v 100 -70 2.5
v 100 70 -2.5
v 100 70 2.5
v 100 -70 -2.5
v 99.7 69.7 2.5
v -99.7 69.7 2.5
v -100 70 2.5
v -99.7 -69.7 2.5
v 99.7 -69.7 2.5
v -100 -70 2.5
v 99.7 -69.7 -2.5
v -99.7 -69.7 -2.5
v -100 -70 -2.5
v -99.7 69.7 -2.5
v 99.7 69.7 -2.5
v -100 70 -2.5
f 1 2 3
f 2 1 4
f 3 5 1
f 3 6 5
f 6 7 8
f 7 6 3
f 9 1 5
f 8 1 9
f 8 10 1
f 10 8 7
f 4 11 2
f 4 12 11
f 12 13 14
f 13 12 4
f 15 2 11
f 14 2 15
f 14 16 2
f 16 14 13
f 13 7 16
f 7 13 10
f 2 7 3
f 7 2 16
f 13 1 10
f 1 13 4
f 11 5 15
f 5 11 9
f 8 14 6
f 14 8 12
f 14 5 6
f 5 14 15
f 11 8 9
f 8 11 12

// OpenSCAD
difference() {
  cube(size=[200, 140, 5], center=true);
  cube(size=[200-0.6, 140-0.6, 10], center=true);
}
